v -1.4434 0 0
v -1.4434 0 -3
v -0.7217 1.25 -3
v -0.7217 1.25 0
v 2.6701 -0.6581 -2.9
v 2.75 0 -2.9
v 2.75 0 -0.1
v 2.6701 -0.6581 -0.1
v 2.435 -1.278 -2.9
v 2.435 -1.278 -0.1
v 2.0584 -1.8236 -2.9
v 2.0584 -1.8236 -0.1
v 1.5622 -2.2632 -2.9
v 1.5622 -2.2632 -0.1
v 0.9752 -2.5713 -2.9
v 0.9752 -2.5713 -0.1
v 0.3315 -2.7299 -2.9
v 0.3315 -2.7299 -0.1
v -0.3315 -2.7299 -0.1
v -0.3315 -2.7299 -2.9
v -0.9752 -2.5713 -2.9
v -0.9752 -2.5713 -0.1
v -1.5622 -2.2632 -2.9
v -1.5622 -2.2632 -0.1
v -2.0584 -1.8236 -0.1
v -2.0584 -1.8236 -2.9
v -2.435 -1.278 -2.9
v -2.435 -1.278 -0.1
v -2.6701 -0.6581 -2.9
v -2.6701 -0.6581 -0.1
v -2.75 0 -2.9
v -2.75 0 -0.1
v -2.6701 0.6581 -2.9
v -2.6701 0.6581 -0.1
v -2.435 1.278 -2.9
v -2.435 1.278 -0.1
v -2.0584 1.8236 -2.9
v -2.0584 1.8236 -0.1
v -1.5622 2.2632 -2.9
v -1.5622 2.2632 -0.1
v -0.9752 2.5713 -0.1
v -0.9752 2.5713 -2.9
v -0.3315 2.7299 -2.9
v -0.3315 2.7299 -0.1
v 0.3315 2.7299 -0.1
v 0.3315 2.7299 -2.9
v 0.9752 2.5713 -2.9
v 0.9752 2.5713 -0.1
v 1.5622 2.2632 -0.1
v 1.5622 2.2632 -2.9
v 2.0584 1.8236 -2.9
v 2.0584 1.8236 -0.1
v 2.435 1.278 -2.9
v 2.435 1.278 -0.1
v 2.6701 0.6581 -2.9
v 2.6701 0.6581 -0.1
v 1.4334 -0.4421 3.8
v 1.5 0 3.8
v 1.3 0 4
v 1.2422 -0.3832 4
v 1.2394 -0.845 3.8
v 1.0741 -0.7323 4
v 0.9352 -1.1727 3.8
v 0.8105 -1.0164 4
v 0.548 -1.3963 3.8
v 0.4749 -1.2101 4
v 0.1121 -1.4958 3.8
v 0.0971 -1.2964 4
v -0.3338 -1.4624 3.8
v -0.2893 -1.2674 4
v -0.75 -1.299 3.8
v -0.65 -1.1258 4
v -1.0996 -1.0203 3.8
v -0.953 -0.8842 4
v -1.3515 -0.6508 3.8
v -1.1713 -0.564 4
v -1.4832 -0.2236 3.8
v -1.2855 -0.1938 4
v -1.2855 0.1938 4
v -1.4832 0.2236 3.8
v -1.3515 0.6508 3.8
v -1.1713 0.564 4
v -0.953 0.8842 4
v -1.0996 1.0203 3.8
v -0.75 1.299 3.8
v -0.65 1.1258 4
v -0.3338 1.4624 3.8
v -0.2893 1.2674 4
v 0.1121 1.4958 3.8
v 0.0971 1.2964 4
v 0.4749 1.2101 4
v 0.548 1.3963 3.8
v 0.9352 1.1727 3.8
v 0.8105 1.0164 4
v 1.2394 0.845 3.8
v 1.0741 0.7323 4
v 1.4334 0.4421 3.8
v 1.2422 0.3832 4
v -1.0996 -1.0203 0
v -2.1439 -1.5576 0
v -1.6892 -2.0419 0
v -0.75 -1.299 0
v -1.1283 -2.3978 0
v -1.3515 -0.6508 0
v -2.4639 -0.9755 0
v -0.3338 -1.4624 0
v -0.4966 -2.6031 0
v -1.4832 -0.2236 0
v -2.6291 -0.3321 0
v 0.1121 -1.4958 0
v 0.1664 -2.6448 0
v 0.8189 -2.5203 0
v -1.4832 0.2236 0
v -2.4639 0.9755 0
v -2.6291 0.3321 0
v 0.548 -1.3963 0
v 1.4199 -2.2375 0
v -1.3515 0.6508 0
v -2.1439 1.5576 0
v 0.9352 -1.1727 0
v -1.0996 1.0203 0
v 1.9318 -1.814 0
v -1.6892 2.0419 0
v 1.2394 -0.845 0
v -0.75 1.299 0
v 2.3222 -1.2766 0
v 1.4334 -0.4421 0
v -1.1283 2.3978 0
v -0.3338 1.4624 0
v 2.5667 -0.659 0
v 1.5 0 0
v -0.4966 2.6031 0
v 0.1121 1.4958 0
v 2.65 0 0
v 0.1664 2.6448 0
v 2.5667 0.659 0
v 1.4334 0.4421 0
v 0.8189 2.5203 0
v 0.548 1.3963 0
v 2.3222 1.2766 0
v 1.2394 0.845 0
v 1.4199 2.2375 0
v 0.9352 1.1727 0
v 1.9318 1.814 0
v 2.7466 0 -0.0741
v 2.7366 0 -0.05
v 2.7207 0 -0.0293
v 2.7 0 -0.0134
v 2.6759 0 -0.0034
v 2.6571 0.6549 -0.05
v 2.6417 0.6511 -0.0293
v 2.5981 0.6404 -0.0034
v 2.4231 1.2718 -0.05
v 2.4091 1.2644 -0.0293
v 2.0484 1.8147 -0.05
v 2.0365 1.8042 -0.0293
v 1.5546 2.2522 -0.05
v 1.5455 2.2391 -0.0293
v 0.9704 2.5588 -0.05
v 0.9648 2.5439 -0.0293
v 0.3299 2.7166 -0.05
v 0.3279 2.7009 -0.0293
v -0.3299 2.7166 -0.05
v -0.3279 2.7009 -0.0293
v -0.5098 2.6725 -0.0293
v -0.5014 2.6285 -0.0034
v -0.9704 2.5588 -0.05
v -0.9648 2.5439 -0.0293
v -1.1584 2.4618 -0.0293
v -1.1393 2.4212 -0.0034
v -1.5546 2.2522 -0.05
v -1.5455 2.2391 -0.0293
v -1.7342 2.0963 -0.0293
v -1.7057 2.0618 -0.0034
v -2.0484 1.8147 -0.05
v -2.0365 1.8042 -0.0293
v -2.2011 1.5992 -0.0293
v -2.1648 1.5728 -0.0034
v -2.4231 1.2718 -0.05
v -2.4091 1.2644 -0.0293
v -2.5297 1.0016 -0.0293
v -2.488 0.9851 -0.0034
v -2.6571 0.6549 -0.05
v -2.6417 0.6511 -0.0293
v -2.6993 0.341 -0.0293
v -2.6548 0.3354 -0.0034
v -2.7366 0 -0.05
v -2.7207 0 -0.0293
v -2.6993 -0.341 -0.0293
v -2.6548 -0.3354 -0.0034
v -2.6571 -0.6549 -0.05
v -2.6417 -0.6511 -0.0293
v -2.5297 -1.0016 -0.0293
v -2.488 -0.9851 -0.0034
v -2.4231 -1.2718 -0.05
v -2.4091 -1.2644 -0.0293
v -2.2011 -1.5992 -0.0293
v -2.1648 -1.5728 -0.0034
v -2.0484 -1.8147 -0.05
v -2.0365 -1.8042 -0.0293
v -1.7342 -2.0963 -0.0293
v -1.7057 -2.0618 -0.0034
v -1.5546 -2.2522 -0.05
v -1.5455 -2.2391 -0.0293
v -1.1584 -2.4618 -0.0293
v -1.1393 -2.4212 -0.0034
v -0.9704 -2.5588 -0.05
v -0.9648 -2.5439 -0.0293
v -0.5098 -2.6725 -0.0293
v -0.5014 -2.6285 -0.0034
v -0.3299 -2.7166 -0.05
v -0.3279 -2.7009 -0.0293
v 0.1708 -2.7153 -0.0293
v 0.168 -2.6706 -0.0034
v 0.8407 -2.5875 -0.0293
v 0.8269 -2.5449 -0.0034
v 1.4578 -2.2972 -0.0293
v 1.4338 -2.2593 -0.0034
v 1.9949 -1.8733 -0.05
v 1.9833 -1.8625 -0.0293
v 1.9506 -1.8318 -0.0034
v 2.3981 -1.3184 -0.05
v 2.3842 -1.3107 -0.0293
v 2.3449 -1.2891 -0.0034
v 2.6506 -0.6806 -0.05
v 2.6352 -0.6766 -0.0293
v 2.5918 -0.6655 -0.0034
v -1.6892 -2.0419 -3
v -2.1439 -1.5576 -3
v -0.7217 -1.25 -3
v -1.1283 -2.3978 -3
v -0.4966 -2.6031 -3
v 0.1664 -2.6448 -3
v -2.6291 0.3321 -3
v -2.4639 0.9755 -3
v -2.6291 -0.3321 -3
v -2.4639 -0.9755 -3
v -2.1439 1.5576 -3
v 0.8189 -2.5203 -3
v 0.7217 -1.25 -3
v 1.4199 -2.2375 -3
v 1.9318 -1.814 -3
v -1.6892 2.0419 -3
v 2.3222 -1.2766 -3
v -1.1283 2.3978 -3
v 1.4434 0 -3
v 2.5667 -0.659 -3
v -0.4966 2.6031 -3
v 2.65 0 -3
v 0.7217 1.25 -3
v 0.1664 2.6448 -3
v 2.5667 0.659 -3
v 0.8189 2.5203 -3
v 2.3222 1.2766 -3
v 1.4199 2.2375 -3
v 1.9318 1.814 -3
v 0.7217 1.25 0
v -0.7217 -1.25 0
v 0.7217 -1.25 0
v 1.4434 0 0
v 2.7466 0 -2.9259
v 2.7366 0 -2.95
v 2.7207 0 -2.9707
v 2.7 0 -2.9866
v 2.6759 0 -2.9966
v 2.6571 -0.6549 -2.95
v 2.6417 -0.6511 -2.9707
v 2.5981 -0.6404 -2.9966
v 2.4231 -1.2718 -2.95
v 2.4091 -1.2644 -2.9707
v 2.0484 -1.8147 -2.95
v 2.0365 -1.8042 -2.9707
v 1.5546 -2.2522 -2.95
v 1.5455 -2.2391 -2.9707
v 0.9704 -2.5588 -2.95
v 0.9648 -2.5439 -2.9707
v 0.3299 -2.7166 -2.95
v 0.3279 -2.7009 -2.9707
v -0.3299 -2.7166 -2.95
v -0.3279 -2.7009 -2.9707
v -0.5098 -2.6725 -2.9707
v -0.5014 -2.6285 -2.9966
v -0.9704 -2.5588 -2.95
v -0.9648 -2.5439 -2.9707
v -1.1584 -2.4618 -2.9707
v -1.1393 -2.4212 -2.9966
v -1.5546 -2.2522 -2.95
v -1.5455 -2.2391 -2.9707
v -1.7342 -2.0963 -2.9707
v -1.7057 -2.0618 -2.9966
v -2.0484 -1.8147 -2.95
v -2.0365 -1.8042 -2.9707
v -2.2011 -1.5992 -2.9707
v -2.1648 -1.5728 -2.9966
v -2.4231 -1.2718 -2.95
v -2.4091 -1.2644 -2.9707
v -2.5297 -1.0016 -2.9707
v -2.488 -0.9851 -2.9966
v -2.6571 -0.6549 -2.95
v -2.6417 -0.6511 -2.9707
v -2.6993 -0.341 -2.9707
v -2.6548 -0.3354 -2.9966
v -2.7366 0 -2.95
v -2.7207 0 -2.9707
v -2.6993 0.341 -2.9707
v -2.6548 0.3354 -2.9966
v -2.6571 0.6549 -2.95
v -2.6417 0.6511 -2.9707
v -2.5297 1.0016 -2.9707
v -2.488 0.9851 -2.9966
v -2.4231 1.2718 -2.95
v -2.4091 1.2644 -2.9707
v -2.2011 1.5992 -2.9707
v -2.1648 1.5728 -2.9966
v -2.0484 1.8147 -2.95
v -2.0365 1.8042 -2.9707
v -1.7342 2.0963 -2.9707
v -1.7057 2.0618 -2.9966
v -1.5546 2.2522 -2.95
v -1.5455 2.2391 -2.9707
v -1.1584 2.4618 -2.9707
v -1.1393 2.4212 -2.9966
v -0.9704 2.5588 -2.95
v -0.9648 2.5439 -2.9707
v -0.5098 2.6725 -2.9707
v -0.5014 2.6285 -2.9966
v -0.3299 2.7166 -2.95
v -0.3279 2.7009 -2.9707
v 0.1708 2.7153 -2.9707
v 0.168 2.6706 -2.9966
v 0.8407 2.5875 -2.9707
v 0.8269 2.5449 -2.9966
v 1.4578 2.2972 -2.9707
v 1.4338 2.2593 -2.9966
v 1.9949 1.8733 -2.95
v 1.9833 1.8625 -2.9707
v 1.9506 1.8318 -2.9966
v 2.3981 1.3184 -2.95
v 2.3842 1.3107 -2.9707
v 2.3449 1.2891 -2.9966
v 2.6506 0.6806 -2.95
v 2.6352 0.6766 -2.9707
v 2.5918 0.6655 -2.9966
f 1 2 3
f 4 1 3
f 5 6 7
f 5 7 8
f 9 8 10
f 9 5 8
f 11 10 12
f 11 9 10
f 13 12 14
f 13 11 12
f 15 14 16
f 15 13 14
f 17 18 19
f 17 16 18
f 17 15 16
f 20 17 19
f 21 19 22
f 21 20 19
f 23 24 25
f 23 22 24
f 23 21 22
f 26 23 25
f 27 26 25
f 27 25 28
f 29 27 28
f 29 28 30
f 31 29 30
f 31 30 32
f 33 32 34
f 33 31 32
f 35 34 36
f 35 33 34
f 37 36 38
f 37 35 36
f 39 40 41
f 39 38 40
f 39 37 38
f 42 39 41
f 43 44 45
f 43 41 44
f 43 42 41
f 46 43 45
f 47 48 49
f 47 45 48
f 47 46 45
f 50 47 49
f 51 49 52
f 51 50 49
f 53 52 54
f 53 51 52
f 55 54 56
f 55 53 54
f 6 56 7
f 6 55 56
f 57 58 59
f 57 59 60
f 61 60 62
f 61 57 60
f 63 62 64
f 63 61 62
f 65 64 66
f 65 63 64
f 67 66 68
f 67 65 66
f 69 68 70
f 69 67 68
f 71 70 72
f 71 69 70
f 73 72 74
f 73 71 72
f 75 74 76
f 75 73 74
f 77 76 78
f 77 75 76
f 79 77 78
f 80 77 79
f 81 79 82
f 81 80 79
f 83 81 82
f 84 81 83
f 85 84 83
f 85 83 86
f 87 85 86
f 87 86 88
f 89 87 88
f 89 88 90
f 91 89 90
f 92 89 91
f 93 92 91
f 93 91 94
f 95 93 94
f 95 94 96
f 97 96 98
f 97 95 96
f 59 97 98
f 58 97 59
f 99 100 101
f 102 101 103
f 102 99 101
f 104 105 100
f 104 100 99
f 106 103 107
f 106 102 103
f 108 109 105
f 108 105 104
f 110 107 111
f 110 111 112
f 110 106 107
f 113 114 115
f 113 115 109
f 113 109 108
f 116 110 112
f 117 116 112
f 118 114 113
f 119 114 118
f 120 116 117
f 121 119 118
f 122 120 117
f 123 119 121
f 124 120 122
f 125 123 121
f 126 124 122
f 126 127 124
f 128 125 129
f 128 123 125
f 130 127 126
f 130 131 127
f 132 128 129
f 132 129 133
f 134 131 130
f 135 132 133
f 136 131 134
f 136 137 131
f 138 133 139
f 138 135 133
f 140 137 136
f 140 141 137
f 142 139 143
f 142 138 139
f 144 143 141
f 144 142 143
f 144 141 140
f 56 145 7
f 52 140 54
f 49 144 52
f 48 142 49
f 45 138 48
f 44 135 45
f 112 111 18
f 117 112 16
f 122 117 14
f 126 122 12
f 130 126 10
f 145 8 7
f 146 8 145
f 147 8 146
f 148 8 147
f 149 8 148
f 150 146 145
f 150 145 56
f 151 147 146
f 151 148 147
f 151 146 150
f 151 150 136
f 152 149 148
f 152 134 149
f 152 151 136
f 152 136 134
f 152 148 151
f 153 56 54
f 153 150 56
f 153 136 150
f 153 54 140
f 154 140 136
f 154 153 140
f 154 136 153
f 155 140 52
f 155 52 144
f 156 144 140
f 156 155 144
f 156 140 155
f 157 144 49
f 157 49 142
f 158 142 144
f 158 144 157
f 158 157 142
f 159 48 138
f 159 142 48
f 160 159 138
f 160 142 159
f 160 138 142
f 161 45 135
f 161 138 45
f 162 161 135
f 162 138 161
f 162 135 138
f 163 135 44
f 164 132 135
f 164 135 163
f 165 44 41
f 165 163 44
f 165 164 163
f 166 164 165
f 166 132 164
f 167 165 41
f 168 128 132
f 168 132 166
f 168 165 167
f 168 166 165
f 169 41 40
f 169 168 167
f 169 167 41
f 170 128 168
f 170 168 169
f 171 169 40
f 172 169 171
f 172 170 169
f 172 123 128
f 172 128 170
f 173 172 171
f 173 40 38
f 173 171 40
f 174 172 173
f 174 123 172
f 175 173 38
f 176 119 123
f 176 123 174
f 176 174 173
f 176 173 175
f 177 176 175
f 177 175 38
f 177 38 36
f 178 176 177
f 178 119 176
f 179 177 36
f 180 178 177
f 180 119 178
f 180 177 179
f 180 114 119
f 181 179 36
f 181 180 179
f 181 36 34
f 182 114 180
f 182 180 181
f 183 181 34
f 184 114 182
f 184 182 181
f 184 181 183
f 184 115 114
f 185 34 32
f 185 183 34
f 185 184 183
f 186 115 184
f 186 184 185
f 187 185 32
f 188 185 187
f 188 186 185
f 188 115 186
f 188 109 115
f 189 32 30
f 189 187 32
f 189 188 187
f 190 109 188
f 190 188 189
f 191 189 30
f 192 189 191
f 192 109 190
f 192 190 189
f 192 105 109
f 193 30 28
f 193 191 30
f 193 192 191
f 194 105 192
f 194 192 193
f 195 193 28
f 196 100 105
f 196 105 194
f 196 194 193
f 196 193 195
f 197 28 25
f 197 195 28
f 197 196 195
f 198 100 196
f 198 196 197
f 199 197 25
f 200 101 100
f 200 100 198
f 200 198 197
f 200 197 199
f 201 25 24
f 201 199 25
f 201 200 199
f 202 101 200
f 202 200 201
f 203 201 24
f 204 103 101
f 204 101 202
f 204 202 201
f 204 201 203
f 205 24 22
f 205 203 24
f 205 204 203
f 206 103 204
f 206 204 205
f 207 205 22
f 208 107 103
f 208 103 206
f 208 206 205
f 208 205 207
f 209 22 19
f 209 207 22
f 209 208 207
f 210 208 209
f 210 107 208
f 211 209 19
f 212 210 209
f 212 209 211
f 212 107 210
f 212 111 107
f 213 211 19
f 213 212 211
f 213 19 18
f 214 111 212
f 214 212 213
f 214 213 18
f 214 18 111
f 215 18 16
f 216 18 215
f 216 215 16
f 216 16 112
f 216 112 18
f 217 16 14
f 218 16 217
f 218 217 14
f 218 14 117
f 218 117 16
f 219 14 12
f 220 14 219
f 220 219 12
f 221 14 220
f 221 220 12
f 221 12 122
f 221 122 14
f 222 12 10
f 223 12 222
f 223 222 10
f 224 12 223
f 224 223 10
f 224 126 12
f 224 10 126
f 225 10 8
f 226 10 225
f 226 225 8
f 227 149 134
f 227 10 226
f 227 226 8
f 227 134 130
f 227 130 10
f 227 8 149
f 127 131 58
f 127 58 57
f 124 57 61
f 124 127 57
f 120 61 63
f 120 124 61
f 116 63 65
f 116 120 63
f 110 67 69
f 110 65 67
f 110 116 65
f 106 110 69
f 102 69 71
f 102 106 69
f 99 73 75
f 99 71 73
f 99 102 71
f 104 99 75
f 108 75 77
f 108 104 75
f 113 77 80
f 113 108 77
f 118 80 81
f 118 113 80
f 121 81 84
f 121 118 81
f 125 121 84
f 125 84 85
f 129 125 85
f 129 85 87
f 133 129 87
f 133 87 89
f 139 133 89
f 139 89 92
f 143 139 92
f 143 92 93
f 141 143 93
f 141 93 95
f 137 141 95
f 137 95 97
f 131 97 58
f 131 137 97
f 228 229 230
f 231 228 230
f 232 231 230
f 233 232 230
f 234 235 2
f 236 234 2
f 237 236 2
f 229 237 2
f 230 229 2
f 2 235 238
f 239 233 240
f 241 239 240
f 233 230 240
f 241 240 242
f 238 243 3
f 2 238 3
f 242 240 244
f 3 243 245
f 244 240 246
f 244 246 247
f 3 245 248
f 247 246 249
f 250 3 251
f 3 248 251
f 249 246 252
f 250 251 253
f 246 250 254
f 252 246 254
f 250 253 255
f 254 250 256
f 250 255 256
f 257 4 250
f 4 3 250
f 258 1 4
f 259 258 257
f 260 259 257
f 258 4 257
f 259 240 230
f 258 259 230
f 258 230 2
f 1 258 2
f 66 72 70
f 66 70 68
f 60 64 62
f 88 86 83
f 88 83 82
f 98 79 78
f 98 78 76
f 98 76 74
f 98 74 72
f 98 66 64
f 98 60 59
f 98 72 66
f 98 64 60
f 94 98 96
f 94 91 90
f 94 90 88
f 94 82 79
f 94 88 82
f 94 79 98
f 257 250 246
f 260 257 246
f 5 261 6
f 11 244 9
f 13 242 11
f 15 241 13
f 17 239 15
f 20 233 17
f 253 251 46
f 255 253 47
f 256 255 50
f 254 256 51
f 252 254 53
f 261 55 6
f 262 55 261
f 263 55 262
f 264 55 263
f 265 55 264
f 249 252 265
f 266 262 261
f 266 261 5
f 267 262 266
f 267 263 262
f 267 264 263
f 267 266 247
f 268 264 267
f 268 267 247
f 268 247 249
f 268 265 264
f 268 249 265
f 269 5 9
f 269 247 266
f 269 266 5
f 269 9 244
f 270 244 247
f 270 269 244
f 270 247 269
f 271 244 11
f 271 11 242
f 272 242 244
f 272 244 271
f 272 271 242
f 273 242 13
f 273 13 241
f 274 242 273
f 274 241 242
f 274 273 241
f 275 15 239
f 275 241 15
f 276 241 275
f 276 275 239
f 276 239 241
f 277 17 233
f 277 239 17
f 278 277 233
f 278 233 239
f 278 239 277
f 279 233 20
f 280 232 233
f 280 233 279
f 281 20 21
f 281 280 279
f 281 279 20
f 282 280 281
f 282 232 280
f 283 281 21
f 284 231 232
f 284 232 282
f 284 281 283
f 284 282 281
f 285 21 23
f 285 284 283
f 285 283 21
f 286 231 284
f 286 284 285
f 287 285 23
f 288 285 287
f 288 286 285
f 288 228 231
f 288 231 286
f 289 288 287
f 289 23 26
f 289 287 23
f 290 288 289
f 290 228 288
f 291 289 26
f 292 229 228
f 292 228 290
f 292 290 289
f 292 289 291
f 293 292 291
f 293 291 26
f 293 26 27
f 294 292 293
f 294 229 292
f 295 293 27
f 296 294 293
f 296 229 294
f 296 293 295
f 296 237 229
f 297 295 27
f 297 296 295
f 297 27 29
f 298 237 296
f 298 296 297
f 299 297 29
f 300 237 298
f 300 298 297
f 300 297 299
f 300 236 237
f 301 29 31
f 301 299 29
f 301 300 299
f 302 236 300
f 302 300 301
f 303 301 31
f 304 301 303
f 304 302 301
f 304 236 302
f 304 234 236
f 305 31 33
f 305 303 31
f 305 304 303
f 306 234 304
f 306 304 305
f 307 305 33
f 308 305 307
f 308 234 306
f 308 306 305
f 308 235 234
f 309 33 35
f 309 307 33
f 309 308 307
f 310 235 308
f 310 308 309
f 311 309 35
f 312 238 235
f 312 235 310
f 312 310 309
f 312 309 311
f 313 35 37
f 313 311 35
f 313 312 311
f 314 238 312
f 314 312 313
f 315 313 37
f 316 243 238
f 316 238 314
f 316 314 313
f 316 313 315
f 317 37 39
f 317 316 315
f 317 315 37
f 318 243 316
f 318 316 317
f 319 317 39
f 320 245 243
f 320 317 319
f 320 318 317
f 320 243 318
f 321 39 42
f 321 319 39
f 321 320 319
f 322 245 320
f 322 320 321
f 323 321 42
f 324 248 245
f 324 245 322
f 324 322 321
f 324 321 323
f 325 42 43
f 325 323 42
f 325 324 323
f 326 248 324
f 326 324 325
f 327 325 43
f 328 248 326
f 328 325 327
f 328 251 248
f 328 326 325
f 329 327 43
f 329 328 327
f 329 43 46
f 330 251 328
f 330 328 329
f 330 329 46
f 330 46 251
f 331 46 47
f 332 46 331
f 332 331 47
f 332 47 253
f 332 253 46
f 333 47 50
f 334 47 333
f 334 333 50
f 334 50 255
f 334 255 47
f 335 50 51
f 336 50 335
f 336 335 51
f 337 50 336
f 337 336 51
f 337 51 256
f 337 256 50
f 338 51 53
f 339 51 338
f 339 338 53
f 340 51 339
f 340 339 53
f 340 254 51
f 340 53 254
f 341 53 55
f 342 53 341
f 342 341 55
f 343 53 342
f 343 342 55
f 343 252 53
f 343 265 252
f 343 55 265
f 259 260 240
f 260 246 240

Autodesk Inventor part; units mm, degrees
ref_plane "YZ Plane" through (0, 0, 0) normal (1, 0, 0) x (0, 1, 0)
ref_plane "XZ Plane" through (0, 0, 0) normal (0, 1, 0) x (-1, 0, 0)
ref_plane "Work Plane1" through (0, 0, -3) normal (0, 0, 1) x (1, 0, 0)
sketch "Sketch1" plane through (0, 0, -3) normal (0, 0, 1) x (1, 0, 0)
  circle A0 centre (0, 0) radius 2.75
extrude "Extrusion3" add sketch "Sketch1" along normal blind 3
fillet "Fillet1" radius 0.1 2 edges at (-2.75, 0, -3) (-2.75, 0, 0)
sketch "Sketch2" plane through (0, 0, -3) normal (0, 0, 1) x (1, 0, 0)
  line L0 (-0.7217, 1.25) -> (0.7217, 1.25)
  line L1 (0.7217, -1.25) -> (-0.7217, -1.25)
  line L2 (-0.7217, -1.25) -> (-1.4434, 0)
  line L3 (0.7217, 1.25) -> (1.4434, 0)
  line L4 (-1.4434, 0) -> (-0.7217, 1.25)
  line L5 (1.4434, 0) -> (0.7217, -1.25)
extrude "Extrusion2" cut sketch "Sketch2" along normal blind 3
sketch "Sketch3" plane through (0, 0, 0) normal (0, 0, 1) x (1, 0, 0)
  circle A0 centre (0, 0) radius 1.5
extrude "Extrusion1" add sketch "Sketch3" along normal blind 4
chamfer "Chamfer1" distance 0.2 angle 45 1 edges at (-1.5, 0, 4)
properties part number "M3 x 4mm SHCS" material "Stainless Steel"
